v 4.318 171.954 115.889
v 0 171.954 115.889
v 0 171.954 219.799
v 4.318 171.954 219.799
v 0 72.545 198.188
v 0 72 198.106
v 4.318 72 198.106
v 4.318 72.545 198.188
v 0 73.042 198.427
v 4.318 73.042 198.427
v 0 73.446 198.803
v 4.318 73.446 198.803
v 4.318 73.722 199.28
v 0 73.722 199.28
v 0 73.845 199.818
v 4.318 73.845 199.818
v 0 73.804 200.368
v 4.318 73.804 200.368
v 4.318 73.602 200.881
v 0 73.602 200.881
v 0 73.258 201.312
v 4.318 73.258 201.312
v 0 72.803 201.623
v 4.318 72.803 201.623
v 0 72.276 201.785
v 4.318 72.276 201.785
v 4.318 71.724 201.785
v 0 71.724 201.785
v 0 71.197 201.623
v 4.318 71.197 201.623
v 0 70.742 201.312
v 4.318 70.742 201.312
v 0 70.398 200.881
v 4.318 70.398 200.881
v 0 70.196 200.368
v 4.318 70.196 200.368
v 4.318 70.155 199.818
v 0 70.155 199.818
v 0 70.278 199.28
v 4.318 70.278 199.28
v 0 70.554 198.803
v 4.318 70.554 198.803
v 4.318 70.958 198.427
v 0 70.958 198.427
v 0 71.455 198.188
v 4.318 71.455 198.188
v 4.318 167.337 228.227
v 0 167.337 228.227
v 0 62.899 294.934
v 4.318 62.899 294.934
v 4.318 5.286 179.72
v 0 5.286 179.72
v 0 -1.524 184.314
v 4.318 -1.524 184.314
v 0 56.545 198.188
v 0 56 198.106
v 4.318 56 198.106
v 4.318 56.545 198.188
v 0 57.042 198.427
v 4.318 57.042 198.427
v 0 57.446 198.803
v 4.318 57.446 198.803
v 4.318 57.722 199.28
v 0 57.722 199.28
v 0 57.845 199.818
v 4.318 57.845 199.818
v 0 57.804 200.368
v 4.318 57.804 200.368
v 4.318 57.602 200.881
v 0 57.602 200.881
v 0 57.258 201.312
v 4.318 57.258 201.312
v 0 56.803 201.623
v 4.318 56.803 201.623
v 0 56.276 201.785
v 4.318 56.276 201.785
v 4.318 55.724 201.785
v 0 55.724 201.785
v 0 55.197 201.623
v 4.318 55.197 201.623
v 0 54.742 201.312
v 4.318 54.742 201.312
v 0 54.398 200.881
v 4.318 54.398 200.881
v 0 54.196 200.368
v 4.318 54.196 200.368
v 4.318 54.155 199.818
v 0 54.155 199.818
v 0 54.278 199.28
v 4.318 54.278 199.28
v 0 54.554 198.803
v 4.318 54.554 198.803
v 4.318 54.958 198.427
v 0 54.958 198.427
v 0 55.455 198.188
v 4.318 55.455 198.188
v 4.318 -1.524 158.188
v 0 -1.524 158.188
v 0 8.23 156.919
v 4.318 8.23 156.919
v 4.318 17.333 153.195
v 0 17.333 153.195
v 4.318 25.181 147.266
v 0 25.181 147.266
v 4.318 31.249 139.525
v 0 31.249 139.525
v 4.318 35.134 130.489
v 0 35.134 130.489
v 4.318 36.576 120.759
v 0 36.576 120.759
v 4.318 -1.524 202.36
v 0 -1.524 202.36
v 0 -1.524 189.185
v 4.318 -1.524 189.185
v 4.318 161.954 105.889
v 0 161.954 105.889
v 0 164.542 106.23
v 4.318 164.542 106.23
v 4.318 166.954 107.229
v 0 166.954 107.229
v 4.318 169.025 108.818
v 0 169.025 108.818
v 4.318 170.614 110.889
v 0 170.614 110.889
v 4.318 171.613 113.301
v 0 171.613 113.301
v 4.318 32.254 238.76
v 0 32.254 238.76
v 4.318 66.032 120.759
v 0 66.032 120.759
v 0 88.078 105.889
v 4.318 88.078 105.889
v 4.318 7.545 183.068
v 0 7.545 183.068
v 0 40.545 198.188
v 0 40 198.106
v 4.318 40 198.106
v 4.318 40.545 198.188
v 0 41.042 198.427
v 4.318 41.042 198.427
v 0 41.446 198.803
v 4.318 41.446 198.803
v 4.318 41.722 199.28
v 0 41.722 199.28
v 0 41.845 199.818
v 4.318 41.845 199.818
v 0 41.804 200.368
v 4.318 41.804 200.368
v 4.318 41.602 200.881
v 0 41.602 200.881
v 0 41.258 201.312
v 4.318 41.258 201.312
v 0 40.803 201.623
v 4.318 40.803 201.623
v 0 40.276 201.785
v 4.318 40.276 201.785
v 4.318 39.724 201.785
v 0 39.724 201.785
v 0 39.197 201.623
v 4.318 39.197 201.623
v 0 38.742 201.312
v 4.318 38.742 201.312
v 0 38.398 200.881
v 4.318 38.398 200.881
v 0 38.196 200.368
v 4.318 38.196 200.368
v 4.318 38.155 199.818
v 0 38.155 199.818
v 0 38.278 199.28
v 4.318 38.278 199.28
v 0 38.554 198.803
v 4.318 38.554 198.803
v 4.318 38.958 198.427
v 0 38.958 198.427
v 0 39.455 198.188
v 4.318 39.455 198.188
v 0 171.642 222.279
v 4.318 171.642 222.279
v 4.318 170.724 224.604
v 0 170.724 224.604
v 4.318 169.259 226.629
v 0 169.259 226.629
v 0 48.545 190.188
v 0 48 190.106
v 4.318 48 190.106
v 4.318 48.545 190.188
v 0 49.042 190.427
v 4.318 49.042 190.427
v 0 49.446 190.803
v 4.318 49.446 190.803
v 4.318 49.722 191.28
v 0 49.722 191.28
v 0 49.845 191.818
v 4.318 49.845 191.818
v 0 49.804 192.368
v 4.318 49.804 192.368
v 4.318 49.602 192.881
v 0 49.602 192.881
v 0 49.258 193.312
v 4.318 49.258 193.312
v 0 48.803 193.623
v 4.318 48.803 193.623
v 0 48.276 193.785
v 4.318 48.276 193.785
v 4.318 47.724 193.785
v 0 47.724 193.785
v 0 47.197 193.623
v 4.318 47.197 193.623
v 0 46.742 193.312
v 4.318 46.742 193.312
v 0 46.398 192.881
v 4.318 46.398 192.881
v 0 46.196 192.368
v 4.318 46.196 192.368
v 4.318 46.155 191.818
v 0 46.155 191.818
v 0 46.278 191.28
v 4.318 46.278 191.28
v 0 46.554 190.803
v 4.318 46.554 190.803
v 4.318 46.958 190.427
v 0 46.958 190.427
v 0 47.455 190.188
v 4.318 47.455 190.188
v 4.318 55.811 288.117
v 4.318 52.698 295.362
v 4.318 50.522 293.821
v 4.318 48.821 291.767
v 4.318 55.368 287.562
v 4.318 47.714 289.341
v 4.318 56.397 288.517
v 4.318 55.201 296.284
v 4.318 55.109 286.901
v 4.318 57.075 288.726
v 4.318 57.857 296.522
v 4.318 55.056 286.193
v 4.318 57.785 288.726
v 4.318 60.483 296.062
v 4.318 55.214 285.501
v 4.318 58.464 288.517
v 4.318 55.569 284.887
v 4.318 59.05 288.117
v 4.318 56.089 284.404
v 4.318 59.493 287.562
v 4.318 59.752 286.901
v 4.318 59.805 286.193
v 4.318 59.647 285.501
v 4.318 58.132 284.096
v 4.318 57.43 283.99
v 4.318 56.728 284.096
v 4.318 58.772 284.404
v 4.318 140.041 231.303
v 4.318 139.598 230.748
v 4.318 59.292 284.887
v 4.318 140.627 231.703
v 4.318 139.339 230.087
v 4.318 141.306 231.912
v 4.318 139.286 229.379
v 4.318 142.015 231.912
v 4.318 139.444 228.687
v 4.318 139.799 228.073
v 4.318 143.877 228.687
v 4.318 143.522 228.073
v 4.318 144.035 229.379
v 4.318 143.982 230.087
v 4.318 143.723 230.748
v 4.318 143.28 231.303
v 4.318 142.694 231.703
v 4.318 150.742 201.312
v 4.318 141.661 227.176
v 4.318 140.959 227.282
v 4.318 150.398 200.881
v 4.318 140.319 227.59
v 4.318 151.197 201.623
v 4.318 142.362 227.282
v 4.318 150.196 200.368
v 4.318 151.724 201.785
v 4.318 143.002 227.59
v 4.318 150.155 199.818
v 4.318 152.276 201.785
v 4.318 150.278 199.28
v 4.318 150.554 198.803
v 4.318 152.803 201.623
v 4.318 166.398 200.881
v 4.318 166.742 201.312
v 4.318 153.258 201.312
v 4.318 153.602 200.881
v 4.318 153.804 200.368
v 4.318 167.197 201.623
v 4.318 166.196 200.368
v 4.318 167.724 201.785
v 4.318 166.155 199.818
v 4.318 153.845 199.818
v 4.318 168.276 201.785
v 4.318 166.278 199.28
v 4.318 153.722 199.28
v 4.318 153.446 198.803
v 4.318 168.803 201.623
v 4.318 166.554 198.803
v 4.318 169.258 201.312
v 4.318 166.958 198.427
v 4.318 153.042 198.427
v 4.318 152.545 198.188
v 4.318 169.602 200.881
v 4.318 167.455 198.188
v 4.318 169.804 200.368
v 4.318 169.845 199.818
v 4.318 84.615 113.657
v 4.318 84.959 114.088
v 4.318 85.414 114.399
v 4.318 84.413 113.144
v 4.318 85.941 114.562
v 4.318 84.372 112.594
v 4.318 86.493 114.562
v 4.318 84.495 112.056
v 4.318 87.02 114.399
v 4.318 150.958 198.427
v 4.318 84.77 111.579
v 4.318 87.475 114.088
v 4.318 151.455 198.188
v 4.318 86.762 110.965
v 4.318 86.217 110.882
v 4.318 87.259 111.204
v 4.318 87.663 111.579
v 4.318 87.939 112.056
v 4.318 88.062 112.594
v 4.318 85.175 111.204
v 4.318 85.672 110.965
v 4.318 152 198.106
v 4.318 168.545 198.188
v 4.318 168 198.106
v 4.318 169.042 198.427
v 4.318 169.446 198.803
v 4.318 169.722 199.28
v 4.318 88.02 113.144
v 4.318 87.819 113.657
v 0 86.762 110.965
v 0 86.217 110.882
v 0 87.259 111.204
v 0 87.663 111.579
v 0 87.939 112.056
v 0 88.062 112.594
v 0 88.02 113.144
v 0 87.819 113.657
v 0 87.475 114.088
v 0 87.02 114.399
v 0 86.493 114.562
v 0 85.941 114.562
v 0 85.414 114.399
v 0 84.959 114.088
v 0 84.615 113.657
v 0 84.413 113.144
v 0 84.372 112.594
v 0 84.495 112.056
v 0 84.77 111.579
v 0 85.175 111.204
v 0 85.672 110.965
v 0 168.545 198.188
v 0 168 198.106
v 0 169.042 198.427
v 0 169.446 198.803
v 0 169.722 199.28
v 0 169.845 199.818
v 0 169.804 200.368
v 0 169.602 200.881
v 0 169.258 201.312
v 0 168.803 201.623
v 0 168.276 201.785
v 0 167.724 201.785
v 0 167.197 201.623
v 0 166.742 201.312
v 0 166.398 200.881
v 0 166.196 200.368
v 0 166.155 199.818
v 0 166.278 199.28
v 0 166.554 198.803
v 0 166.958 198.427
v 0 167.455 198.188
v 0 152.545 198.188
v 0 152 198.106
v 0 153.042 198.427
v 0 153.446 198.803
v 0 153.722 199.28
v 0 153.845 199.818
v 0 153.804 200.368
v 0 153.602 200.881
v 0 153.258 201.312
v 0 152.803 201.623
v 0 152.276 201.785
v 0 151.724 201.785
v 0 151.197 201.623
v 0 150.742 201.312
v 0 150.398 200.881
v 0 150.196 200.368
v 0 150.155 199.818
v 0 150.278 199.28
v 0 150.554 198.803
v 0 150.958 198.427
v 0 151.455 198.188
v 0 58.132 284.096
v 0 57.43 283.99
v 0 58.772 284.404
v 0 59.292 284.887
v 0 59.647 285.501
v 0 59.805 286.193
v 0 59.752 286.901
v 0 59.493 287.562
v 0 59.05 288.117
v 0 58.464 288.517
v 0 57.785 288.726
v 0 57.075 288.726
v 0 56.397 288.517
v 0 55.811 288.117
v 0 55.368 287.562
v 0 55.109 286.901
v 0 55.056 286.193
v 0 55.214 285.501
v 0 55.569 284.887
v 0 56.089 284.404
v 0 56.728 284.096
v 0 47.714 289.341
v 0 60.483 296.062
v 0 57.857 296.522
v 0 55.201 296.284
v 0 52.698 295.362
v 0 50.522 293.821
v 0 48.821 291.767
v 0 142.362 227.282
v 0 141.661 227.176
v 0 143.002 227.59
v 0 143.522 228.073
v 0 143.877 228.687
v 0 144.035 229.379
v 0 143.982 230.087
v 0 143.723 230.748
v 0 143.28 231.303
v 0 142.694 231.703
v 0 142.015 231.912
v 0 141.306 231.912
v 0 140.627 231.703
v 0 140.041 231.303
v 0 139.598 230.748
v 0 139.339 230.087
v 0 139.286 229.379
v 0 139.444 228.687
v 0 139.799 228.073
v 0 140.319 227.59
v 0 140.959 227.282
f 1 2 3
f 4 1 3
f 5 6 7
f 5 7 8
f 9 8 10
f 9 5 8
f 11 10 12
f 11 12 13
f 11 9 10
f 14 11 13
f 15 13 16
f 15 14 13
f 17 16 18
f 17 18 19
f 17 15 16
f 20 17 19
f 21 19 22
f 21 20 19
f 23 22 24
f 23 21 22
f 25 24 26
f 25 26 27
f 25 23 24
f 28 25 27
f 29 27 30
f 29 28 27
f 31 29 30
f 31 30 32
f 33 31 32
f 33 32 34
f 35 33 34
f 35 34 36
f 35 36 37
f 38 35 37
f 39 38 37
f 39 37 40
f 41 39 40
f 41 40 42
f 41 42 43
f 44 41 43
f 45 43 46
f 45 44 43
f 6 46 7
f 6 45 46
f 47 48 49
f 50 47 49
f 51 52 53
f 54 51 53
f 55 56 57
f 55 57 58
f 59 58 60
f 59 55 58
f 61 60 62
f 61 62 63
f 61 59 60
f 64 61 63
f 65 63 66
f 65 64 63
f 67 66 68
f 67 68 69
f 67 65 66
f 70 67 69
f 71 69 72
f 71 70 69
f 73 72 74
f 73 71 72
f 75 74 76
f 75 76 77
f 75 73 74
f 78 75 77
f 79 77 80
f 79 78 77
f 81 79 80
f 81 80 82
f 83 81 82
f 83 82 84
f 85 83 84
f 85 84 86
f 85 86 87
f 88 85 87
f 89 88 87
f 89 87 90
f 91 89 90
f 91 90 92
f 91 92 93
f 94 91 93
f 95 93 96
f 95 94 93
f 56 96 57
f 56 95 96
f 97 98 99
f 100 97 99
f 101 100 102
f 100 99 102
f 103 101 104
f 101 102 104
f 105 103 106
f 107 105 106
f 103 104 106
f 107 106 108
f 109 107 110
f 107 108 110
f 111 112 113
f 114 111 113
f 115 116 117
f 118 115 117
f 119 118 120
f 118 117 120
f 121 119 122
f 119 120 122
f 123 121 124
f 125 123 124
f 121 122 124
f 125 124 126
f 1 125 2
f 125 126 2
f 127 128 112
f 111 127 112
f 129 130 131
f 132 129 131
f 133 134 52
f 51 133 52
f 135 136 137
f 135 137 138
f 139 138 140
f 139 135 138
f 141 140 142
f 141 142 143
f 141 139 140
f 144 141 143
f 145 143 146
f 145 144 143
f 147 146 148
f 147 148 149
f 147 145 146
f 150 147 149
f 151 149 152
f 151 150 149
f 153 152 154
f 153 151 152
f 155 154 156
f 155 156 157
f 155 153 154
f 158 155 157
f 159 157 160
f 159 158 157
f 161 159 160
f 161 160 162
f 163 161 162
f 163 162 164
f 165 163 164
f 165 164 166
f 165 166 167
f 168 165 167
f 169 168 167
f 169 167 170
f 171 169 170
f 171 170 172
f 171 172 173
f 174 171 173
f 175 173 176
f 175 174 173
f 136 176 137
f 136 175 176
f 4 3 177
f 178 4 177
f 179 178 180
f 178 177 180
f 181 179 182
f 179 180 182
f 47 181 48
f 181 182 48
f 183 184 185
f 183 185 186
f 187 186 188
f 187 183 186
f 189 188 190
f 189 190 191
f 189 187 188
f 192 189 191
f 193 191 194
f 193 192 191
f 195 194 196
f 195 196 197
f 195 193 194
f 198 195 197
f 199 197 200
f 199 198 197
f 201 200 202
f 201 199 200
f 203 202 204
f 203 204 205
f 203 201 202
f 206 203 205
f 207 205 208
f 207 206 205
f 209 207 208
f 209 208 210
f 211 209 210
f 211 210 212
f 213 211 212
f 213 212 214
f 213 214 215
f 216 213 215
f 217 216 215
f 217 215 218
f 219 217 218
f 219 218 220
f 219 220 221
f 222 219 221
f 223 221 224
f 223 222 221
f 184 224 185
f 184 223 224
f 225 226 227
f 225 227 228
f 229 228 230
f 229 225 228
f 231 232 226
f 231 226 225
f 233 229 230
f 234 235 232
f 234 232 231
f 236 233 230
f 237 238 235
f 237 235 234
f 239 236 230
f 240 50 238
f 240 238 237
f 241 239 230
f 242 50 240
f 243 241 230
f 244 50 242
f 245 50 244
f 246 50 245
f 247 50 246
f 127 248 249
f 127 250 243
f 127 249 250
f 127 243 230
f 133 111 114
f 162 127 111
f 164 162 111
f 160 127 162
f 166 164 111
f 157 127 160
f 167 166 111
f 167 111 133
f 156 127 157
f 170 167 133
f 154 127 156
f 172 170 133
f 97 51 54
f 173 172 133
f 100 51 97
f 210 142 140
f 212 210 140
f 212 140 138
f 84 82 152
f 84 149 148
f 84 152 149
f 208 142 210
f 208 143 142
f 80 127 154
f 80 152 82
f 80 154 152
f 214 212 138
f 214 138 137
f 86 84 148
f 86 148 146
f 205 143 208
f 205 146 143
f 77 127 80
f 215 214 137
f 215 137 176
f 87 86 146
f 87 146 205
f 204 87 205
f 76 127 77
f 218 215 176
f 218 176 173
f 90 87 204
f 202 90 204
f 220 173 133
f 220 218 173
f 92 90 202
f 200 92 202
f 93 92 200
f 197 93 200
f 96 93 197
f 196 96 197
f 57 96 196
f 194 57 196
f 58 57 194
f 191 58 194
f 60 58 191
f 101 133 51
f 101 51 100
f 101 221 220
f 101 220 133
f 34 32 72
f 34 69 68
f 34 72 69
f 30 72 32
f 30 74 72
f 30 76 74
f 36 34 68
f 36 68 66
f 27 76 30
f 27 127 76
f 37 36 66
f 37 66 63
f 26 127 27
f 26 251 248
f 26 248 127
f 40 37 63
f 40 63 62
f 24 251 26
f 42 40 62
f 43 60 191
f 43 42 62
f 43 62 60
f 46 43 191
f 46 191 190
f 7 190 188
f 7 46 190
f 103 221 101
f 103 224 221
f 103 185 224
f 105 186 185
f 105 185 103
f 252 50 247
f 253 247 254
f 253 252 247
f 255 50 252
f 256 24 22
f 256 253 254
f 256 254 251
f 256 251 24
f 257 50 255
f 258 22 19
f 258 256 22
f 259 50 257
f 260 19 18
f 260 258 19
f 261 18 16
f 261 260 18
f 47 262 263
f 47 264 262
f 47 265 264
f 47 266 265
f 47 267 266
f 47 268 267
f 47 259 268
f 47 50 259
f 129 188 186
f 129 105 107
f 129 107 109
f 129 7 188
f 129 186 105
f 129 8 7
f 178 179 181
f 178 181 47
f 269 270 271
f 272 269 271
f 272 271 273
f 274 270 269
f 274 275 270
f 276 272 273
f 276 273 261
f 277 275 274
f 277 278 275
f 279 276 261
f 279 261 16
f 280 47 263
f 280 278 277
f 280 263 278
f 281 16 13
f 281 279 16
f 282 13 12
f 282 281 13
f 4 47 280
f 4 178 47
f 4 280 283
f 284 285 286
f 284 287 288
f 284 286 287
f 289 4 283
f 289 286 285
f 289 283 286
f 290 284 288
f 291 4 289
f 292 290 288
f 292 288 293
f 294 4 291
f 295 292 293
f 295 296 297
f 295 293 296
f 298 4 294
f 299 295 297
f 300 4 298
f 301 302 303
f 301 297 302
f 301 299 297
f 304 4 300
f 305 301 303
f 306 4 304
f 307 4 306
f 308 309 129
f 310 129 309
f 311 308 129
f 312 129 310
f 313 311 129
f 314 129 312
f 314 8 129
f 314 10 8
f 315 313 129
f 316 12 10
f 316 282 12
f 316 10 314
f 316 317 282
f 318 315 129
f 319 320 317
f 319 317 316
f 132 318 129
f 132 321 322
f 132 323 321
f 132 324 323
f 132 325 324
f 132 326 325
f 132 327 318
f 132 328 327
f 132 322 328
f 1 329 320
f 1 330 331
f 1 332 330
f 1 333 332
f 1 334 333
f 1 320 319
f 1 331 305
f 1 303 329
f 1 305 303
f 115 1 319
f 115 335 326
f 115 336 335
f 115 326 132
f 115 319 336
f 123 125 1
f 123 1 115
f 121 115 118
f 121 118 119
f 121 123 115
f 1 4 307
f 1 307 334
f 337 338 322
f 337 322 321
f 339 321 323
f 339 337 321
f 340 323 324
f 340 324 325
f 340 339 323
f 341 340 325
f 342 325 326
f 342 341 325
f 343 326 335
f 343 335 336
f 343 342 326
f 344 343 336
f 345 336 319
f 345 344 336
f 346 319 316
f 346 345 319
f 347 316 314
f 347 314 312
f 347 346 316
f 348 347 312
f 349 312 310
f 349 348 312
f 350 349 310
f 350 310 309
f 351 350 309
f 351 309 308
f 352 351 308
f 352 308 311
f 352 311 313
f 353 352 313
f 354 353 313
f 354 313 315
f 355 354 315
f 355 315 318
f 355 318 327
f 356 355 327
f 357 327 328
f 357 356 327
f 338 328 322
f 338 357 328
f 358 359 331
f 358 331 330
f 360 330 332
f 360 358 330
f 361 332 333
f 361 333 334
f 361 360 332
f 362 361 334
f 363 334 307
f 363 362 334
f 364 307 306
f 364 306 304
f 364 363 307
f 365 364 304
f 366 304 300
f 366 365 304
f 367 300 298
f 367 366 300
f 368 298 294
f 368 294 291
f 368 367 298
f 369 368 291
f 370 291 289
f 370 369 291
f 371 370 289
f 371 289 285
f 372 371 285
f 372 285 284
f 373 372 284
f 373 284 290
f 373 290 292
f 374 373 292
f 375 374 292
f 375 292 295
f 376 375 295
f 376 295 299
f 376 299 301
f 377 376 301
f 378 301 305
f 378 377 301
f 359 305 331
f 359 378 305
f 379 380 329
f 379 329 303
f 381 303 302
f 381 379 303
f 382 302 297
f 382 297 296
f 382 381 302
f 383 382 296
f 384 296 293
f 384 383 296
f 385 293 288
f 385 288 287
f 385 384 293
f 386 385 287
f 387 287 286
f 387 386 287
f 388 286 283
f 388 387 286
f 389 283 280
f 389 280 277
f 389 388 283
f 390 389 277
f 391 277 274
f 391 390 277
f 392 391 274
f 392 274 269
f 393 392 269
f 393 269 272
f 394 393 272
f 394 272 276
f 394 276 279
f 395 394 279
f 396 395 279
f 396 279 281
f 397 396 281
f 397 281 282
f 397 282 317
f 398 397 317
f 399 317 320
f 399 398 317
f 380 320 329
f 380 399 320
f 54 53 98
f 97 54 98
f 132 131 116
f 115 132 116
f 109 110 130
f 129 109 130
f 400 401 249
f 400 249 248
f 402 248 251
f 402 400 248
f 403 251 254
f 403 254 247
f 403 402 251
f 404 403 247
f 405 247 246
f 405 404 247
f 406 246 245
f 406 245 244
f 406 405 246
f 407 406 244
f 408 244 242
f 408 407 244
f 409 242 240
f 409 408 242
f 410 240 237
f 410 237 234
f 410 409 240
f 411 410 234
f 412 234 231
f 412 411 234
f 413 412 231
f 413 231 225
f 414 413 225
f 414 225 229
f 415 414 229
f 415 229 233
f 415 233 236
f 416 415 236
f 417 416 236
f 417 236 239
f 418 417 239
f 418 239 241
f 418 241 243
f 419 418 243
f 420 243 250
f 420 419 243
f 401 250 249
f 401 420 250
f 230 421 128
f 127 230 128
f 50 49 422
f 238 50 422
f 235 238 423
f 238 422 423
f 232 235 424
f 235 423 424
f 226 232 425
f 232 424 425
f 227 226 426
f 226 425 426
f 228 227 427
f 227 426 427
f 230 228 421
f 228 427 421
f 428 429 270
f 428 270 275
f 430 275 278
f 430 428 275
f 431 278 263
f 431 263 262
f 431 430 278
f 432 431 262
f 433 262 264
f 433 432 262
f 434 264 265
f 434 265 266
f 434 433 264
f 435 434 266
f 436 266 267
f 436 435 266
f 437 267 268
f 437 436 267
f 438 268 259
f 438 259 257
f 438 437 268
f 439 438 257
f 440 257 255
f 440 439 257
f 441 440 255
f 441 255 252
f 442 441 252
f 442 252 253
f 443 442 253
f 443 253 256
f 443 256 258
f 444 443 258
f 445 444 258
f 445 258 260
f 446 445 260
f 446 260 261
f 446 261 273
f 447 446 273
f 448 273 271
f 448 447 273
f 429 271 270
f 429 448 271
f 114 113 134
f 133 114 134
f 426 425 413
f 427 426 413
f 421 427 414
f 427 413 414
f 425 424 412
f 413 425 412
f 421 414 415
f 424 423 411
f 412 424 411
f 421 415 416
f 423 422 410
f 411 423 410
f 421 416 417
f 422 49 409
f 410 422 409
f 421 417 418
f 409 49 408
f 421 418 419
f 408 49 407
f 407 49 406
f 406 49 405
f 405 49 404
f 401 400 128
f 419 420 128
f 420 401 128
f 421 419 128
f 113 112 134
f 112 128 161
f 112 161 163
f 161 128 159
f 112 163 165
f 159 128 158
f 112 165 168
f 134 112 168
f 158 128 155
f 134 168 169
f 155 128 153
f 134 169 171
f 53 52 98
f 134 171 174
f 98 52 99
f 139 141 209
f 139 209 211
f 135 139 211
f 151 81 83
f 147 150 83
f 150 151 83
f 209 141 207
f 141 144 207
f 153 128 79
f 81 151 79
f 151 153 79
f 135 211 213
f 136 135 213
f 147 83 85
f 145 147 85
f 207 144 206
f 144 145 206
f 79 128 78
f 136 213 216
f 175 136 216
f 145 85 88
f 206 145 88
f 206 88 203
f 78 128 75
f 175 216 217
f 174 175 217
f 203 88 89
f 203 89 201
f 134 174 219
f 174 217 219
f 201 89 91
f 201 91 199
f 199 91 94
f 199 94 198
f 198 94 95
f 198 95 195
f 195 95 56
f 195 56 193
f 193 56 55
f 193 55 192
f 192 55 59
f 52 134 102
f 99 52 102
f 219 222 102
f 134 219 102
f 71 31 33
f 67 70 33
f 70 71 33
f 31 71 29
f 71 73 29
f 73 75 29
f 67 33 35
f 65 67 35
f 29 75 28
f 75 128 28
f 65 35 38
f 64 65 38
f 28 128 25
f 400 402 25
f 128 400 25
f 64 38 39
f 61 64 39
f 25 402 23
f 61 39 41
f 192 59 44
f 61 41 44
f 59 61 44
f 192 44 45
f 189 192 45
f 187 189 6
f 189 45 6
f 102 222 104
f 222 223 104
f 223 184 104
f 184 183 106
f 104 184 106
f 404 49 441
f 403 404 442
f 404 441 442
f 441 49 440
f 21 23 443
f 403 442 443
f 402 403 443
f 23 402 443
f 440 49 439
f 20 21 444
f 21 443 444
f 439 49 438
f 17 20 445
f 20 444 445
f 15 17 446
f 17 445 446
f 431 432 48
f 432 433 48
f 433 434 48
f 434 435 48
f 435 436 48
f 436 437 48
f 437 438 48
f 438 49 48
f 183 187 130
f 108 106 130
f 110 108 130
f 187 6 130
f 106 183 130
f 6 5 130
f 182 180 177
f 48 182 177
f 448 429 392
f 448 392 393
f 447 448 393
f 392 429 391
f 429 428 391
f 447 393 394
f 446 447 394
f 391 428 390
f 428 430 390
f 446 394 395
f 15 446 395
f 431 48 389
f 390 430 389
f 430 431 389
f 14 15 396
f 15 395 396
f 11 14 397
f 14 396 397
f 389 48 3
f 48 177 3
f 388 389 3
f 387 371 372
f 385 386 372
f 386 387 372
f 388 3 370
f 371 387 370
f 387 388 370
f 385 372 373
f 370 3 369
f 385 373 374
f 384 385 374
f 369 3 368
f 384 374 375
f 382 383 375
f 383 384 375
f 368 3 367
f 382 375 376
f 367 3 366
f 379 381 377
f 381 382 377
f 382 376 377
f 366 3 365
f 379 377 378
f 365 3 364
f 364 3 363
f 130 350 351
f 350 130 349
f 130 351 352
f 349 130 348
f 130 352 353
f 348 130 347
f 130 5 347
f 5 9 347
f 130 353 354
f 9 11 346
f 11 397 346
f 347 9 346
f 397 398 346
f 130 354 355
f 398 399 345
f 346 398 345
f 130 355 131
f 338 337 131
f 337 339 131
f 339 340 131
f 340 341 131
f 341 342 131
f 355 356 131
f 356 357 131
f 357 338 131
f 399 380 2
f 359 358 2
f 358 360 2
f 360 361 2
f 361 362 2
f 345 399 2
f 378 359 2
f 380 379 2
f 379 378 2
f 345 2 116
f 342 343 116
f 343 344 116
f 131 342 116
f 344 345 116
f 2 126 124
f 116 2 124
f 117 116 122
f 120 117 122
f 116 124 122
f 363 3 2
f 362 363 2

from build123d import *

# Parameters (mm, degrees)
SKETCH2_R           = 2.38125
SKETCH2_R_2         = 1.85
BOSS_EXTRUDE1_DEPTH = 4.318


with BuildPart() as part:
    # Sketch2 → Boss-Extrude1 (new body)
    with BuildSketch(Plane(origin=(0, 0, 0), x_dir=(0, 0, -1), z_dir=(1, 0, 0))):
        with BuildLine():
            Line((-115.889220019, 171.954), (-219.799081889, 171.954))
            ThreePointArc((-219.799081889, 171.954), (-224.603807745, 170.72409746), (-228.226664693, 167.336921891))
            Line((-228.226664693, 167.336921891), (-294.933682845, 62.899419265))
            ThreePointArc((-294.933682845, 62.899419265), (-295.905218473, 53.919072951), (-289.341021135, 47.714089896))
            Line((-289.341021135, 47.714089896), (-238.759677477, 32.254))
            Line((-238.759677477, 32.254), (-202.359677477, -1.524))
            Line((-202.359677477, -1.524), (-189.18491037, -1.524))
            Line((-189.18491037, -1.524), (-183.068077693, 7.544577378))
            Line((-183.068077693, 7.544577378), (-179.720203102, 5.286407453))
            Line((-179.720203102, 5.286407453), (-184.313880932, -1.524))
            Line((-184.313880932, -1.524), (-158.188157254, -1.524))
            ThreePointArc((-158.188157254, -1.524), (-147.265506636, 25.180552261), (-120.759258716, 36.576))
            Line((-120.759258716, 36.576), (-120.759258716, 66.032))
            Line((-120.759258716, 66.032), (-105.889220019, 88.077738973))
            Line((-105.889220019, 88.077738973), (-105.889220019, 161.954))
            ThreePointArc((-105.889220019, 161.954), (-108.818152207, 169.025067812), (-115.889220019, 171.954))
        make_face()
        with Locations((-286.371258716, 57.430370624)):
            Circle(SKETCH2_R, mode=Mode.SUBTRACT)
        with Locations((-229.557259723, 141.660587995)):
            Circle(SKETCH2_R, mode=Mode.SUBTRACT)
        with Locations((-112.732319414, 86.216867448)):
            Circle(SKETCH2_R_2, mode=Mode.SUBTRACT)
        with Locations((-199.955990958, 72)):
            Circle(SKETCH2_R_2, mode=Mode.SUBTRACT)
        with Locations((-199.955990958, 152)):
            Circle(SKETCH2_R_2, mode=Mode.SUBTRACT)
        with Locations((-199.955990958, 168)):
            Circle(SKETCH2_R_2, mode=Mode.SUBTRACT)
        with Locations((-199.955990958, 40)):
            Circle(SKETCH2_R_2, mode=Mode.SUBTRACT)
        with Locations((-191.955990958, 48)):
            Circle(SKETCH2_R_2, mode=Mode.SUBTRACT)
        with Locations((-199.955990958, 56)):
            Circle(SKETCH2_R_2, mode=Mode.SUBTRACT)
    extrude(amount=BOSS_EXTRUDE1_DEPTH)


solid = part.part
